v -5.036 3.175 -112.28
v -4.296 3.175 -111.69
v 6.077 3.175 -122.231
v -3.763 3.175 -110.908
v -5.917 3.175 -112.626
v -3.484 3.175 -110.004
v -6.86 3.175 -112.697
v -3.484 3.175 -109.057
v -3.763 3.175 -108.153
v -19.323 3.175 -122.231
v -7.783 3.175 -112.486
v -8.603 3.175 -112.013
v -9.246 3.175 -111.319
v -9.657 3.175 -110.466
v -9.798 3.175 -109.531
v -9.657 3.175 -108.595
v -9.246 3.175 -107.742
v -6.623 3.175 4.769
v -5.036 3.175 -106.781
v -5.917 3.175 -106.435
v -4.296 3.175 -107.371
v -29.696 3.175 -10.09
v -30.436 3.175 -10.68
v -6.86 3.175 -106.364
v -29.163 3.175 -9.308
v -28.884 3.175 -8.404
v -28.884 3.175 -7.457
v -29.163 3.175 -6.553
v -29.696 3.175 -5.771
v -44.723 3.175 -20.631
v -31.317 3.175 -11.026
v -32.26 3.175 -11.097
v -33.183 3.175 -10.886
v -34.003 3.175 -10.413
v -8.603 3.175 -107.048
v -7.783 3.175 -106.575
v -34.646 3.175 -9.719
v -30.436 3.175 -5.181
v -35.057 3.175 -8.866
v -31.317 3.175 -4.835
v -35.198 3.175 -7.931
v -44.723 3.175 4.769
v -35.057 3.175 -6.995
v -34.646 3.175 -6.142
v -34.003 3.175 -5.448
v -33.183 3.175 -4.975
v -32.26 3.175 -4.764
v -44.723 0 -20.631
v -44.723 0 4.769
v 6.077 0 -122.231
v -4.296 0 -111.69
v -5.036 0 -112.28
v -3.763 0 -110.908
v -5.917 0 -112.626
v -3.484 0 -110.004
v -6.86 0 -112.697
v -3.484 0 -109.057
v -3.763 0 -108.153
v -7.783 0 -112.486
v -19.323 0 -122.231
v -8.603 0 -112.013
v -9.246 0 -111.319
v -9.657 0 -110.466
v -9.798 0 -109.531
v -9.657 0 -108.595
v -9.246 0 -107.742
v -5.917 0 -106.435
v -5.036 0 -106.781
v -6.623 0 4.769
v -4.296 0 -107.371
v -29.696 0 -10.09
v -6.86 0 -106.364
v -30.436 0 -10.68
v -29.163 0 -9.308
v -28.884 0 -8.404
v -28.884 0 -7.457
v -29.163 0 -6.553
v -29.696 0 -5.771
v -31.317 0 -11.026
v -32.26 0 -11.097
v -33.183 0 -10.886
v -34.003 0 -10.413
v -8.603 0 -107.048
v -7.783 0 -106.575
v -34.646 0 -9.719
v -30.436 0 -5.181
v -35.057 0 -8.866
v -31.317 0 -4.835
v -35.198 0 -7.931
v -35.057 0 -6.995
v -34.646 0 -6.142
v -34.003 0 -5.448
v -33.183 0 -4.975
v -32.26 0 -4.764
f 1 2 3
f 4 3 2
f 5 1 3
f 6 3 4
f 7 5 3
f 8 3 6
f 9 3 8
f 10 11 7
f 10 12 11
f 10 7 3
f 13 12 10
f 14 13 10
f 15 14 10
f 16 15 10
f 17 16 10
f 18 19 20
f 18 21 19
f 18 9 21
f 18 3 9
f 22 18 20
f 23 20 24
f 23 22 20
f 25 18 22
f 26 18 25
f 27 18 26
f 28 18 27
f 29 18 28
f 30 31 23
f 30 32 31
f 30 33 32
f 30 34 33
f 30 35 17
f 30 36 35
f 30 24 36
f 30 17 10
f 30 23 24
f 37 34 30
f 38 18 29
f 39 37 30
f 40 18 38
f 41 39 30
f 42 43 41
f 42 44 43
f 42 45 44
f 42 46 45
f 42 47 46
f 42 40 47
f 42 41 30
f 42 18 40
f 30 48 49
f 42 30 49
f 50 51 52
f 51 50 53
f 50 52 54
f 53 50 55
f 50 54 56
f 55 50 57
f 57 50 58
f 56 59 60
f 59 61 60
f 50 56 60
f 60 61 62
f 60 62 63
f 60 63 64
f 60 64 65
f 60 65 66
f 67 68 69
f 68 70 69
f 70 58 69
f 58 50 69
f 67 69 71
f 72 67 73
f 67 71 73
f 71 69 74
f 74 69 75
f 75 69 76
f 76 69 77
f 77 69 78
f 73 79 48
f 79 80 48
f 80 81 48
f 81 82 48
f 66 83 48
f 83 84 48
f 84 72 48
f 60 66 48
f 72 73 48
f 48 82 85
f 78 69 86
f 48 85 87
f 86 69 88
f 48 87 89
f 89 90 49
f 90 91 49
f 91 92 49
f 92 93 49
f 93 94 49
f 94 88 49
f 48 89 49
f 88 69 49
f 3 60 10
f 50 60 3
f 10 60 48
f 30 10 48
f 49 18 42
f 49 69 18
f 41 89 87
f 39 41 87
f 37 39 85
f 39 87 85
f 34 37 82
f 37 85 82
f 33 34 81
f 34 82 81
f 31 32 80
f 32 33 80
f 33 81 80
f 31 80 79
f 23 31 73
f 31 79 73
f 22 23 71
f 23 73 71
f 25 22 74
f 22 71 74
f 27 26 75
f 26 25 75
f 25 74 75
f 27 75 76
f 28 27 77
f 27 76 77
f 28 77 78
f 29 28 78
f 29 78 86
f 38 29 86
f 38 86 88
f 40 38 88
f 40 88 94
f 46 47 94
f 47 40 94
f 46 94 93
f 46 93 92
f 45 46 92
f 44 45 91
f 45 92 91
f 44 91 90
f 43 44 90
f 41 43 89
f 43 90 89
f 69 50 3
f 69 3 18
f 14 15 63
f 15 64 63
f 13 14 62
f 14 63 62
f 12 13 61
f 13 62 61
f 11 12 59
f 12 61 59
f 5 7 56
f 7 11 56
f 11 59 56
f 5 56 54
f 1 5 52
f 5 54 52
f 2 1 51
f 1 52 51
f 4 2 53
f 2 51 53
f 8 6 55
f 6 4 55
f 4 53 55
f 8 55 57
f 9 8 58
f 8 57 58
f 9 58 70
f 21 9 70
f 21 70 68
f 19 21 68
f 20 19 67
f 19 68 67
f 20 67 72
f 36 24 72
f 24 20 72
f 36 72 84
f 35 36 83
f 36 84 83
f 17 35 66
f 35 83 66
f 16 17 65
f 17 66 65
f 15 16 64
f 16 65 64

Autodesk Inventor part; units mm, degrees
ref_plane "YZ Plane" through (0, 0, 0) normal (1, 0, 0) x (0, 1, 0)
ref_plane "XZ Plane" through (0, 0, 0) normal (0, 1, 0) x (-1, 0, 0)
ref_plane "XY Plane" through (0, 0, 0) normal (0, 0, 1) x (1, 0, 0)
sketch "Sketch1" plane through (0, 0, 0) normal (0, 1, 0) x (-1, 0, 0)
  line L0 (19.3231, -122.2306) -> (-6.0769, -122.2306)
  circle A0 centre (32.0231, -7.9306) radius 3.175
  circle A1 centre (6.6231, -109.5306) radius 3.175
  line L1 (19.3231, -122.2306) -> (44.7231, -20.6306)
  line L2 (44.7231, -20.6306) -> (44.7231, 4.7694)
  line L3 (-6.0769, -122.2306) -> (6.6231, 4.7694)
  line L4 (6.6231, 4.7694) -> (44.7231, 4.7694)
  dimension "d0" = 25.4
  dimension "d2" = 6.35
  dimension "d3" = 6.35
  dimension "d6" = 12.7
  dimension "d10" = 25.4
  dimension "d12" = 12.7
  dimension "d13" = 38.1
  dimension "d14" = 12.7
  dimension "d15" = 12.7
  dimension "d16" = 50.8
  dimension "d17" = 127
extrude "Extrusion1" add sketch "Sketch1" along normal blind 3.175
properties part number "15102898-16-P-0213" material "Aluminum 6061"
